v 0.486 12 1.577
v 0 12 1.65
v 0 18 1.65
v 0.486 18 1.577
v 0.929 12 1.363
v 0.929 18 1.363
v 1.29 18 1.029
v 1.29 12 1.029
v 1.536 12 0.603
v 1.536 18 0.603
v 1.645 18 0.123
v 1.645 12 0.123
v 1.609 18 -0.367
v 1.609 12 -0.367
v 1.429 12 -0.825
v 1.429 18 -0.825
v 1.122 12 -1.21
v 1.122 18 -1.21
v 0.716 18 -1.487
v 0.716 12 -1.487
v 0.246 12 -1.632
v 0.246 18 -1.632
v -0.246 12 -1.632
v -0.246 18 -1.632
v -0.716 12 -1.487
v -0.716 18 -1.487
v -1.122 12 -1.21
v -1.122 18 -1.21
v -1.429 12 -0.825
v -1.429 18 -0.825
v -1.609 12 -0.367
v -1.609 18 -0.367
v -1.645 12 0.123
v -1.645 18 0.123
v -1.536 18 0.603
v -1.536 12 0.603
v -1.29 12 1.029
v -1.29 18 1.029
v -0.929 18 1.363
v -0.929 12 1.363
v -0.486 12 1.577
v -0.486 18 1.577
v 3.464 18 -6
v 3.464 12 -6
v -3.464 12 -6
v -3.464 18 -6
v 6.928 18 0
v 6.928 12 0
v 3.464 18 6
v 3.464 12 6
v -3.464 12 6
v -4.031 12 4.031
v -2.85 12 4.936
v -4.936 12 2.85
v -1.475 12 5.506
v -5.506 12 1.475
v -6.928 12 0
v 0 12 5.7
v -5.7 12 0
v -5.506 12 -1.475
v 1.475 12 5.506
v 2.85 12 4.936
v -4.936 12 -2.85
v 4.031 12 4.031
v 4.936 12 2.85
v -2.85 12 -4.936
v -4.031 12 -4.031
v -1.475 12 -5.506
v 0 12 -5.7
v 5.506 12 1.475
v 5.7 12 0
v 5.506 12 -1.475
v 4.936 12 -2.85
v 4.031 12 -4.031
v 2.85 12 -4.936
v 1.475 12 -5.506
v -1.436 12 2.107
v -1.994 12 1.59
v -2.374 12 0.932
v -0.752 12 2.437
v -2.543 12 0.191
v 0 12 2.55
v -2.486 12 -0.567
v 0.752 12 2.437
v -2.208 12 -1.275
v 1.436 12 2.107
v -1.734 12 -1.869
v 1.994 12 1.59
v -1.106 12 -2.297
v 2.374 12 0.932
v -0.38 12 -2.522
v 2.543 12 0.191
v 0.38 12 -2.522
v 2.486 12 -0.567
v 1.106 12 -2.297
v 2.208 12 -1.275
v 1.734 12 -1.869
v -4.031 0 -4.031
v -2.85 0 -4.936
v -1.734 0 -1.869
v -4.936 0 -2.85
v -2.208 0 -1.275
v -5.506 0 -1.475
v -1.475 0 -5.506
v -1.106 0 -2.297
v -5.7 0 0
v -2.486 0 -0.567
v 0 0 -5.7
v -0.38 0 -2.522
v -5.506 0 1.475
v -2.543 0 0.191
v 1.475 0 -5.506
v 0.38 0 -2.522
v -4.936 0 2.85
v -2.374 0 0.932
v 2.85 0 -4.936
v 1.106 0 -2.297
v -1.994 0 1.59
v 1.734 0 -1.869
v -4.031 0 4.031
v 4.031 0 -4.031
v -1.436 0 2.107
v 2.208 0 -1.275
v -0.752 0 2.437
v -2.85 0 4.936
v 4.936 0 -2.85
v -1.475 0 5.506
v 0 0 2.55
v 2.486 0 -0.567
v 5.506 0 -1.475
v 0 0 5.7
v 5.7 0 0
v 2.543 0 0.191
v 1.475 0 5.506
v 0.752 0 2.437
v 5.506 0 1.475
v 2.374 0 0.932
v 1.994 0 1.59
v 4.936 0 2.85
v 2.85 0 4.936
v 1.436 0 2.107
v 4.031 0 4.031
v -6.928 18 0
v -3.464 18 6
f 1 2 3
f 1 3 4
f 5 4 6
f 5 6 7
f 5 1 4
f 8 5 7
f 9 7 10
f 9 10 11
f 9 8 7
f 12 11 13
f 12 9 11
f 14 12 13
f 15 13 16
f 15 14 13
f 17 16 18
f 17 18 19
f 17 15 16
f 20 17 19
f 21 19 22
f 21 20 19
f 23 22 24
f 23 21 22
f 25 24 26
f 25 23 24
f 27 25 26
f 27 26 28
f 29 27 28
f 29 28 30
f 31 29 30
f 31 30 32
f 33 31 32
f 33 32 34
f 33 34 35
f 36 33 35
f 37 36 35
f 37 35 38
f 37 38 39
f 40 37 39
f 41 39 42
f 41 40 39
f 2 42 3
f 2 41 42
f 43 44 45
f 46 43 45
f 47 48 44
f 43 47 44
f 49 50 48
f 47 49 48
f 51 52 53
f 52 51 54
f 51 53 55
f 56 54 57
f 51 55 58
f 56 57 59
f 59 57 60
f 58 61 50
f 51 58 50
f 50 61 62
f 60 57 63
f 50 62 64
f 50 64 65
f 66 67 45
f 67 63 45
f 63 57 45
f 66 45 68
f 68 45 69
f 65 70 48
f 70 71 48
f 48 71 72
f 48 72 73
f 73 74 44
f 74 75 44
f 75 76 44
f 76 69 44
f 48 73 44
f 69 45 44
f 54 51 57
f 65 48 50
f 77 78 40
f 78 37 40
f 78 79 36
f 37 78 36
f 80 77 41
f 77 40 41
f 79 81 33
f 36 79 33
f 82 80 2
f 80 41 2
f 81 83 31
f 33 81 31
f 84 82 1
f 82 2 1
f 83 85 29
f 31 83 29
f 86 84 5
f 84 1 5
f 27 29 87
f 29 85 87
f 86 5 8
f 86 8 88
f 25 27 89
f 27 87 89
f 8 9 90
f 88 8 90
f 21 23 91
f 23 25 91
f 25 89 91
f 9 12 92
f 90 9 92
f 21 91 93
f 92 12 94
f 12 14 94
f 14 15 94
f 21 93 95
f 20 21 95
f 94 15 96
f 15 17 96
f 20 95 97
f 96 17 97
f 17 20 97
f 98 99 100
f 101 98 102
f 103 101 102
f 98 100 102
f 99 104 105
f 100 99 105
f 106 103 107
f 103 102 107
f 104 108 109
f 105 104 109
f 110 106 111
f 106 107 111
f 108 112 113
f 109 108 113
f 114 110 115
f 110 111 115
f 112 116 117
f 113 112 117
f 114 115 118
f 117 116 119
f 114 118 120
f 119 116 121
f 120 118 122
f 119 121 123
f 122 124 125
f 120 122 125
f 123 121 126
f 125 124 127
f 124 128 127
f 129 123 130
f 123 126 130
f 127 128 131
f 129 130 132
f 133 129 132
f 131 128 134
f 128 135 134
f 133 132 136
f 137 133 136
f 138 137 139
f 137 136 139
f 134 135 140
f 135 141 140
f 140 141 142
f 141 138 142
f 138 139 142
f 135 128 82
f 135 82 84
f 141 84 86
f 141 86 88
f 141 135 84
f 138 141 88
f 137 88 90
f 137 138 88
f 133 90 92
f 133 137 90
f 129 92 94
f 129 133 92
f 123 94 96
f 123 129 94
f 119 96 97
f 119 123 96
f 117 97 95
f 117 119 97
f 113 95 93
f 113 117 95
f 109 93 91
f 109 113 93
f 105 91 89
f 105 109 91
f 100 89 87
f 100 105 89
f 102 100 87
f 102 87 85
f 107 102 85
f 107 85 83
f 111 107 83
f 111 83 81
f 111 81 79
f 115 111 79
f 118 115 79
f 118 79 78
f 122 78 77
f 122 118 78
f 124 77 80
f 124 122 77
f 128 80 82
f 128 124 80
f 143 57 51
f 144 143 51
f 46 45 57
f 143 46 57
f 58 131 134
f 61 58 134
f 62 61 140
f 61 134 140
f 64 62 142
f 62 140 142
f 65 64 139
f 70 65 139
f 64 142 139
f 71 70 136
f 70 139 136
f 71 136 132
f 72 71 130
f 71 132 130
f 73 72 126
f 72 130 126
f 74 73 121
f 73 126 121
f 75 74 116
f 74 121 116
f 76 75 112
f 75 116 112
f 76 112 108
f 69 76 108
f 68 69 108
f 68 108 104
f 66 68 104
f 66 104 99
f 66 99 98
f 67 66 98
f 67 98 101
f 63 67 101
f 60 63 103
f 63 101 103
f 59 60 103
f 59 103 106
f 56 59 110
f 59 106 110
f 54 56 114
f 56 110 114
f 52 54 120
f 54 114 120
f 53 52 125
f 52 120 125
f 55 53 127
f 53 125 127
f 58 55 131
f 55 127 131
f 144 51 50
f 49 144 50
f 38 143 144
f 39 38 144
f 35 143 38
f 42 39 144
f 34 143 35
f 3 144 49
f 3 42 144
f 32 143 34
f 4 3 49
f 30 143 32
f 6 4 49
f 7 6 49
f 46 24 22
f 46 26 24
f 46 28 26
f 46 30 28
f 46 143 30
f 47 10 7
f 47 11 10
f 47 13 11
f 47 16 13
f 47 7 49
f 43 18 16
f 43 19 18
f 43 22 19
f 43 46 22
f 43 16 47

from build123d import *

# Parameters (mm, degrees)
SKETCH1_R           = 5.7
SKETCH1_R_2         = 2.55
BOSS_EXTRUDE1_DEPTH = 12
SKETCH2_R           = 1.65
BOSS_EXTRUDE2_DEPTH = 6


with BuildPart() as part:
    # Sketch1 → Boss-Extrude1 (new body)
    with BuildSketch(Plane(origin=(0, 0, 0), x_dir=(1, 0, 0), z_dir=(0, 1, 0))):
        with Locations(Location((0, 0, 0), (0, 0, 270))):
            Circle(SKETCH1_R)
        with Locations(Location((0, 0, 0), (0, 0, 270))):
            Circle(SKETCH1_R_2, mode=Mode.SUBTRACT)
    extrude(amount=BOSS_EXTRUDE1_DEPTH)

    # Sketch2 → Boss-Extrude2 (add)
    with BuildSketch(Plane(origin=(0, 12, 0), x_dir=(1, 0, 0), z_dir=(0, 1, 0))):
        Polygon((6.92820323, 0), (3.464101615, 6), (-3.464101615, 6), (-6.92820323, 0), (-3.464101615, -6), (3.464101615, -6), align=None)
        with Locations(Location((0, 0, 0), (0, 0, 270))):
            Circle(SKETCH2_R, mode=Mode.SUBTRACT)
    extrude(amount=BOSS_EXTRUDE2_DEPTH)


solid = part.part
